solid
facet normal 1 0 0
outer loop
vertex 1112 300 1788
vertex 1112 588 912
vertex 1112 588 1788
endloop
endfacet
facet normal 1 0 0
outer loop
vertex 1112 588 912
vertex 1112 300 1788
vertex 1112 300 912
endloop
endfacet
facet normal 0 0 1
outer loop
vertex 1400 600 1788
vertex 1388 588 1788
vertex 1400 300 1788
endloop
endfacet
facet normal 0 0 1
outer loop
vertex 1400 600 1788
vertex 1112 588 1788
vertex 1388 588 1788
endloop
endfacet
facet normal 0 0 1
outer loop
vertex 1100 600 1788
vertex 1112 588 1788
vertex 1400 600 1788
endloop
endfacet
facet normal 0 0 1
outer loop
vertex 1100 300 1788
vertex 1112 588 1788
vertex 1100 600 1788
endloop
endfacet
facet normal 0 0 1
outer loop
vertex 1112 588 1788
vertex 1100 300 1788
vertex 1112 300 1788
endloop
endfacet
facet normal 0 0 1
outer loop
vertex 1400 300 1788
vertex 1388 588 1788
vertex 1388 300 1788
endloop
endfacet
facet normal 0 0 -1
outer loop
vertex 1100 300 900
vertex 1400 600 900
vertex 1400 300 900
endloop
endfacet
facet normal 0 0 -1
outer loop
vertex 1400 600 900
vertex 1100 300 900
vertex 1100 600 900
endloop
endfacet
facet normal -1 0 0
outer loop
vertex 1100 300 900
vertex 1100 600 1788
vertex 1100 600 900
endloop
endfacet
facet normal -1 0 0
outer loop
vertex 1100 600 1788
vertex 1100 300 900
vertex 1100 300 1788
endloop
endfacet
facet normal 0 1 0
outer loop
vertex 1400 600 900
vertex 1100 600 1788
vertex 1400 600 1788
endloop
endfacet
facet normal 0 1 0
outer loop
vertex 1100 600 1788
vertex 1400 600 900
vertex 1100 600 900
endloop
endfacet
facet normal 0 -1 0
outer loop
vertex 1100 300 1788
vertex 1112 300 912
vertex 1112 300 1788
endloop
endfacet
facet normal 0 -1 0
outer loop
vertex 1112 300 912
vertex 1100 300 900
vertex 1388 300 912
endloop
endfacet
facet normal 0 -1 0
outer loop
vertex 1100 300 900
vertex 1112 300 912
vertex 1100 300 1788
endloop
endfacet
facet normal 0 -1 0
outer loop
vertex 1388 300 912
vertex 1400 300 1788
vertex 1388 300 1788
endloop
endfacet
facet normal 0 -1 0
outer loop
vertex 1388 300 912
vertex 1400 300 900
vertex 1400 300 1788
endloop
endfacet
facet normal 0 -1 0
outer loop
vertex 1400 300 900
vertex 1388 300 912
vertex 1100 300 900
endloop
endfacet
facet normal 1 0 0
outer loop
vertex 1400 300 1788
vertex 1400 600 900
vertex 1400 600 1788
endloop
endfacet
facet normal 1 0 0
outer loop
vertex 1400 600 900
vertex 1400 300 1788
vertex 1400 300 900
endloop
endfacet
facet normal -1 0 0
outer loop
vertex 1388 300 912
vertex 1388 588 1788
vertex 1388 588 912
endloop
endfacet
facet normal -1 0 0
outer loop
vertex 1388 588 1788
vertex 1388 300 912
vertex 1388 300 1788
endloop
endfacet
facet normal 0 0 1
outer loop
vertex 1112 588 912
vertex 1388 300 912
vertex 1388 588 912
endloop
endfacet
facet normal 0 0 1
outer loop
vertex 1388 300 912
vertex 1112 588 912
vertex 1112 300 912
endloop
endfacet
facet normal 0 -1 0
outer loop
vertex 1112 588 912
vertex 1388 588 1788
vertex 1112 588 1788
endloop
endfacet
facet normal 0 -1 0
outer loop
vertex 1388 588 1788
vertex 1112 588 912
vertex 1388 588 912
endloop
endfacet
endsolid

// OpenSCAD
// file: cabinet.scad
/*

    Cabinet
    
    By Anton Augustsson


*/

module cabinet (
    thickness,
    length,
    width,
    height
    ){
/*
    ---------- Local varibles ---------- 
*/



/*
    ---------- Code ---------- 
*/


union () {

// Left
translate([
    0,
    0,
    0]) 
cube(size = [
    thickness,
    width,
    height-thickness]);

// Right
translate([
    length-thickness,
    0,
    0]) 
cube(size = [
    thickness,
    width,
    height-thickness]);
    
// Bottom 
translate([
    thickness,
    0,
    0]) 
cube(size = [
    length
    -thickness*2,
    width-thickness,
    thickness]);

// Back
translate([
    thickness,
    width-thickness,
    0]) 
cube(size = [
    length
    -thickness*2,
    thickness,
    height-thickness]);
}}



/*
    ---------- Example ---------- 
*/


thickness = 12;

length = 600;
width  = 600;
height = 900;

cabinet (
    thickness,
    length,
    width,
    height
    );
// main file
/*

    Second Section Right Cabinet
    
    By Anton Augustsson


*/

use <cabinet.scad>;

module secondSectionRightCabinet (
    plywoodThickness,
    lengthMiddleSection,
    lengthSecondSection,
    length,
    widthCabinet,
    widthCabinetDoor,
    widthTable,
    width,
    heightTable,
    heightCabinet,
    x,y,z
	){

/*
    ---------- Local varibles ---------- 
*/

thickness = plywoodThickness;

length = lengthSecondSection;
width  = widthCabinet;
height = heightCabinet;


/*
    ---------- Code ---------- 
*/


translate([
	x,
	y,
	z,])

union () {

cabinet (
    thickness,
    length,
    width,
    height
    );

}}



/*
    ---------- Example ---------- 
*/


plywoodThickness = 12;

lengthMiddleSection = 600;
lengthSecondSection = lengthMiddleSection/2;
lengthTirdSection   = 200;
length=lengthMiddleSection
    +lengthSecondSection*2
    +lengthTirdSection*2;

widthCabinet     = 300;
widthCabinetDoor = widthCabinet/3;
widthTable       = 300;
width            = widthCabinet+widthTable;

heightTable   = 900;
heightCabinet = 900;


x=lengthMiddleSection+
    lengthSecondSection+lengthTirdSection;
y=width-widthCabinet;
z=heightTable;

secondSectionRightCabinet (
    plywoodThickness,
    lengthMiddleSection,
    lengthSecondSection,
    length,
    widthCabinet,
    widthCabinetDoor,
    widthTable,
    width,
    heightTable,
    heightCabinet,
    x,y,z
    );
